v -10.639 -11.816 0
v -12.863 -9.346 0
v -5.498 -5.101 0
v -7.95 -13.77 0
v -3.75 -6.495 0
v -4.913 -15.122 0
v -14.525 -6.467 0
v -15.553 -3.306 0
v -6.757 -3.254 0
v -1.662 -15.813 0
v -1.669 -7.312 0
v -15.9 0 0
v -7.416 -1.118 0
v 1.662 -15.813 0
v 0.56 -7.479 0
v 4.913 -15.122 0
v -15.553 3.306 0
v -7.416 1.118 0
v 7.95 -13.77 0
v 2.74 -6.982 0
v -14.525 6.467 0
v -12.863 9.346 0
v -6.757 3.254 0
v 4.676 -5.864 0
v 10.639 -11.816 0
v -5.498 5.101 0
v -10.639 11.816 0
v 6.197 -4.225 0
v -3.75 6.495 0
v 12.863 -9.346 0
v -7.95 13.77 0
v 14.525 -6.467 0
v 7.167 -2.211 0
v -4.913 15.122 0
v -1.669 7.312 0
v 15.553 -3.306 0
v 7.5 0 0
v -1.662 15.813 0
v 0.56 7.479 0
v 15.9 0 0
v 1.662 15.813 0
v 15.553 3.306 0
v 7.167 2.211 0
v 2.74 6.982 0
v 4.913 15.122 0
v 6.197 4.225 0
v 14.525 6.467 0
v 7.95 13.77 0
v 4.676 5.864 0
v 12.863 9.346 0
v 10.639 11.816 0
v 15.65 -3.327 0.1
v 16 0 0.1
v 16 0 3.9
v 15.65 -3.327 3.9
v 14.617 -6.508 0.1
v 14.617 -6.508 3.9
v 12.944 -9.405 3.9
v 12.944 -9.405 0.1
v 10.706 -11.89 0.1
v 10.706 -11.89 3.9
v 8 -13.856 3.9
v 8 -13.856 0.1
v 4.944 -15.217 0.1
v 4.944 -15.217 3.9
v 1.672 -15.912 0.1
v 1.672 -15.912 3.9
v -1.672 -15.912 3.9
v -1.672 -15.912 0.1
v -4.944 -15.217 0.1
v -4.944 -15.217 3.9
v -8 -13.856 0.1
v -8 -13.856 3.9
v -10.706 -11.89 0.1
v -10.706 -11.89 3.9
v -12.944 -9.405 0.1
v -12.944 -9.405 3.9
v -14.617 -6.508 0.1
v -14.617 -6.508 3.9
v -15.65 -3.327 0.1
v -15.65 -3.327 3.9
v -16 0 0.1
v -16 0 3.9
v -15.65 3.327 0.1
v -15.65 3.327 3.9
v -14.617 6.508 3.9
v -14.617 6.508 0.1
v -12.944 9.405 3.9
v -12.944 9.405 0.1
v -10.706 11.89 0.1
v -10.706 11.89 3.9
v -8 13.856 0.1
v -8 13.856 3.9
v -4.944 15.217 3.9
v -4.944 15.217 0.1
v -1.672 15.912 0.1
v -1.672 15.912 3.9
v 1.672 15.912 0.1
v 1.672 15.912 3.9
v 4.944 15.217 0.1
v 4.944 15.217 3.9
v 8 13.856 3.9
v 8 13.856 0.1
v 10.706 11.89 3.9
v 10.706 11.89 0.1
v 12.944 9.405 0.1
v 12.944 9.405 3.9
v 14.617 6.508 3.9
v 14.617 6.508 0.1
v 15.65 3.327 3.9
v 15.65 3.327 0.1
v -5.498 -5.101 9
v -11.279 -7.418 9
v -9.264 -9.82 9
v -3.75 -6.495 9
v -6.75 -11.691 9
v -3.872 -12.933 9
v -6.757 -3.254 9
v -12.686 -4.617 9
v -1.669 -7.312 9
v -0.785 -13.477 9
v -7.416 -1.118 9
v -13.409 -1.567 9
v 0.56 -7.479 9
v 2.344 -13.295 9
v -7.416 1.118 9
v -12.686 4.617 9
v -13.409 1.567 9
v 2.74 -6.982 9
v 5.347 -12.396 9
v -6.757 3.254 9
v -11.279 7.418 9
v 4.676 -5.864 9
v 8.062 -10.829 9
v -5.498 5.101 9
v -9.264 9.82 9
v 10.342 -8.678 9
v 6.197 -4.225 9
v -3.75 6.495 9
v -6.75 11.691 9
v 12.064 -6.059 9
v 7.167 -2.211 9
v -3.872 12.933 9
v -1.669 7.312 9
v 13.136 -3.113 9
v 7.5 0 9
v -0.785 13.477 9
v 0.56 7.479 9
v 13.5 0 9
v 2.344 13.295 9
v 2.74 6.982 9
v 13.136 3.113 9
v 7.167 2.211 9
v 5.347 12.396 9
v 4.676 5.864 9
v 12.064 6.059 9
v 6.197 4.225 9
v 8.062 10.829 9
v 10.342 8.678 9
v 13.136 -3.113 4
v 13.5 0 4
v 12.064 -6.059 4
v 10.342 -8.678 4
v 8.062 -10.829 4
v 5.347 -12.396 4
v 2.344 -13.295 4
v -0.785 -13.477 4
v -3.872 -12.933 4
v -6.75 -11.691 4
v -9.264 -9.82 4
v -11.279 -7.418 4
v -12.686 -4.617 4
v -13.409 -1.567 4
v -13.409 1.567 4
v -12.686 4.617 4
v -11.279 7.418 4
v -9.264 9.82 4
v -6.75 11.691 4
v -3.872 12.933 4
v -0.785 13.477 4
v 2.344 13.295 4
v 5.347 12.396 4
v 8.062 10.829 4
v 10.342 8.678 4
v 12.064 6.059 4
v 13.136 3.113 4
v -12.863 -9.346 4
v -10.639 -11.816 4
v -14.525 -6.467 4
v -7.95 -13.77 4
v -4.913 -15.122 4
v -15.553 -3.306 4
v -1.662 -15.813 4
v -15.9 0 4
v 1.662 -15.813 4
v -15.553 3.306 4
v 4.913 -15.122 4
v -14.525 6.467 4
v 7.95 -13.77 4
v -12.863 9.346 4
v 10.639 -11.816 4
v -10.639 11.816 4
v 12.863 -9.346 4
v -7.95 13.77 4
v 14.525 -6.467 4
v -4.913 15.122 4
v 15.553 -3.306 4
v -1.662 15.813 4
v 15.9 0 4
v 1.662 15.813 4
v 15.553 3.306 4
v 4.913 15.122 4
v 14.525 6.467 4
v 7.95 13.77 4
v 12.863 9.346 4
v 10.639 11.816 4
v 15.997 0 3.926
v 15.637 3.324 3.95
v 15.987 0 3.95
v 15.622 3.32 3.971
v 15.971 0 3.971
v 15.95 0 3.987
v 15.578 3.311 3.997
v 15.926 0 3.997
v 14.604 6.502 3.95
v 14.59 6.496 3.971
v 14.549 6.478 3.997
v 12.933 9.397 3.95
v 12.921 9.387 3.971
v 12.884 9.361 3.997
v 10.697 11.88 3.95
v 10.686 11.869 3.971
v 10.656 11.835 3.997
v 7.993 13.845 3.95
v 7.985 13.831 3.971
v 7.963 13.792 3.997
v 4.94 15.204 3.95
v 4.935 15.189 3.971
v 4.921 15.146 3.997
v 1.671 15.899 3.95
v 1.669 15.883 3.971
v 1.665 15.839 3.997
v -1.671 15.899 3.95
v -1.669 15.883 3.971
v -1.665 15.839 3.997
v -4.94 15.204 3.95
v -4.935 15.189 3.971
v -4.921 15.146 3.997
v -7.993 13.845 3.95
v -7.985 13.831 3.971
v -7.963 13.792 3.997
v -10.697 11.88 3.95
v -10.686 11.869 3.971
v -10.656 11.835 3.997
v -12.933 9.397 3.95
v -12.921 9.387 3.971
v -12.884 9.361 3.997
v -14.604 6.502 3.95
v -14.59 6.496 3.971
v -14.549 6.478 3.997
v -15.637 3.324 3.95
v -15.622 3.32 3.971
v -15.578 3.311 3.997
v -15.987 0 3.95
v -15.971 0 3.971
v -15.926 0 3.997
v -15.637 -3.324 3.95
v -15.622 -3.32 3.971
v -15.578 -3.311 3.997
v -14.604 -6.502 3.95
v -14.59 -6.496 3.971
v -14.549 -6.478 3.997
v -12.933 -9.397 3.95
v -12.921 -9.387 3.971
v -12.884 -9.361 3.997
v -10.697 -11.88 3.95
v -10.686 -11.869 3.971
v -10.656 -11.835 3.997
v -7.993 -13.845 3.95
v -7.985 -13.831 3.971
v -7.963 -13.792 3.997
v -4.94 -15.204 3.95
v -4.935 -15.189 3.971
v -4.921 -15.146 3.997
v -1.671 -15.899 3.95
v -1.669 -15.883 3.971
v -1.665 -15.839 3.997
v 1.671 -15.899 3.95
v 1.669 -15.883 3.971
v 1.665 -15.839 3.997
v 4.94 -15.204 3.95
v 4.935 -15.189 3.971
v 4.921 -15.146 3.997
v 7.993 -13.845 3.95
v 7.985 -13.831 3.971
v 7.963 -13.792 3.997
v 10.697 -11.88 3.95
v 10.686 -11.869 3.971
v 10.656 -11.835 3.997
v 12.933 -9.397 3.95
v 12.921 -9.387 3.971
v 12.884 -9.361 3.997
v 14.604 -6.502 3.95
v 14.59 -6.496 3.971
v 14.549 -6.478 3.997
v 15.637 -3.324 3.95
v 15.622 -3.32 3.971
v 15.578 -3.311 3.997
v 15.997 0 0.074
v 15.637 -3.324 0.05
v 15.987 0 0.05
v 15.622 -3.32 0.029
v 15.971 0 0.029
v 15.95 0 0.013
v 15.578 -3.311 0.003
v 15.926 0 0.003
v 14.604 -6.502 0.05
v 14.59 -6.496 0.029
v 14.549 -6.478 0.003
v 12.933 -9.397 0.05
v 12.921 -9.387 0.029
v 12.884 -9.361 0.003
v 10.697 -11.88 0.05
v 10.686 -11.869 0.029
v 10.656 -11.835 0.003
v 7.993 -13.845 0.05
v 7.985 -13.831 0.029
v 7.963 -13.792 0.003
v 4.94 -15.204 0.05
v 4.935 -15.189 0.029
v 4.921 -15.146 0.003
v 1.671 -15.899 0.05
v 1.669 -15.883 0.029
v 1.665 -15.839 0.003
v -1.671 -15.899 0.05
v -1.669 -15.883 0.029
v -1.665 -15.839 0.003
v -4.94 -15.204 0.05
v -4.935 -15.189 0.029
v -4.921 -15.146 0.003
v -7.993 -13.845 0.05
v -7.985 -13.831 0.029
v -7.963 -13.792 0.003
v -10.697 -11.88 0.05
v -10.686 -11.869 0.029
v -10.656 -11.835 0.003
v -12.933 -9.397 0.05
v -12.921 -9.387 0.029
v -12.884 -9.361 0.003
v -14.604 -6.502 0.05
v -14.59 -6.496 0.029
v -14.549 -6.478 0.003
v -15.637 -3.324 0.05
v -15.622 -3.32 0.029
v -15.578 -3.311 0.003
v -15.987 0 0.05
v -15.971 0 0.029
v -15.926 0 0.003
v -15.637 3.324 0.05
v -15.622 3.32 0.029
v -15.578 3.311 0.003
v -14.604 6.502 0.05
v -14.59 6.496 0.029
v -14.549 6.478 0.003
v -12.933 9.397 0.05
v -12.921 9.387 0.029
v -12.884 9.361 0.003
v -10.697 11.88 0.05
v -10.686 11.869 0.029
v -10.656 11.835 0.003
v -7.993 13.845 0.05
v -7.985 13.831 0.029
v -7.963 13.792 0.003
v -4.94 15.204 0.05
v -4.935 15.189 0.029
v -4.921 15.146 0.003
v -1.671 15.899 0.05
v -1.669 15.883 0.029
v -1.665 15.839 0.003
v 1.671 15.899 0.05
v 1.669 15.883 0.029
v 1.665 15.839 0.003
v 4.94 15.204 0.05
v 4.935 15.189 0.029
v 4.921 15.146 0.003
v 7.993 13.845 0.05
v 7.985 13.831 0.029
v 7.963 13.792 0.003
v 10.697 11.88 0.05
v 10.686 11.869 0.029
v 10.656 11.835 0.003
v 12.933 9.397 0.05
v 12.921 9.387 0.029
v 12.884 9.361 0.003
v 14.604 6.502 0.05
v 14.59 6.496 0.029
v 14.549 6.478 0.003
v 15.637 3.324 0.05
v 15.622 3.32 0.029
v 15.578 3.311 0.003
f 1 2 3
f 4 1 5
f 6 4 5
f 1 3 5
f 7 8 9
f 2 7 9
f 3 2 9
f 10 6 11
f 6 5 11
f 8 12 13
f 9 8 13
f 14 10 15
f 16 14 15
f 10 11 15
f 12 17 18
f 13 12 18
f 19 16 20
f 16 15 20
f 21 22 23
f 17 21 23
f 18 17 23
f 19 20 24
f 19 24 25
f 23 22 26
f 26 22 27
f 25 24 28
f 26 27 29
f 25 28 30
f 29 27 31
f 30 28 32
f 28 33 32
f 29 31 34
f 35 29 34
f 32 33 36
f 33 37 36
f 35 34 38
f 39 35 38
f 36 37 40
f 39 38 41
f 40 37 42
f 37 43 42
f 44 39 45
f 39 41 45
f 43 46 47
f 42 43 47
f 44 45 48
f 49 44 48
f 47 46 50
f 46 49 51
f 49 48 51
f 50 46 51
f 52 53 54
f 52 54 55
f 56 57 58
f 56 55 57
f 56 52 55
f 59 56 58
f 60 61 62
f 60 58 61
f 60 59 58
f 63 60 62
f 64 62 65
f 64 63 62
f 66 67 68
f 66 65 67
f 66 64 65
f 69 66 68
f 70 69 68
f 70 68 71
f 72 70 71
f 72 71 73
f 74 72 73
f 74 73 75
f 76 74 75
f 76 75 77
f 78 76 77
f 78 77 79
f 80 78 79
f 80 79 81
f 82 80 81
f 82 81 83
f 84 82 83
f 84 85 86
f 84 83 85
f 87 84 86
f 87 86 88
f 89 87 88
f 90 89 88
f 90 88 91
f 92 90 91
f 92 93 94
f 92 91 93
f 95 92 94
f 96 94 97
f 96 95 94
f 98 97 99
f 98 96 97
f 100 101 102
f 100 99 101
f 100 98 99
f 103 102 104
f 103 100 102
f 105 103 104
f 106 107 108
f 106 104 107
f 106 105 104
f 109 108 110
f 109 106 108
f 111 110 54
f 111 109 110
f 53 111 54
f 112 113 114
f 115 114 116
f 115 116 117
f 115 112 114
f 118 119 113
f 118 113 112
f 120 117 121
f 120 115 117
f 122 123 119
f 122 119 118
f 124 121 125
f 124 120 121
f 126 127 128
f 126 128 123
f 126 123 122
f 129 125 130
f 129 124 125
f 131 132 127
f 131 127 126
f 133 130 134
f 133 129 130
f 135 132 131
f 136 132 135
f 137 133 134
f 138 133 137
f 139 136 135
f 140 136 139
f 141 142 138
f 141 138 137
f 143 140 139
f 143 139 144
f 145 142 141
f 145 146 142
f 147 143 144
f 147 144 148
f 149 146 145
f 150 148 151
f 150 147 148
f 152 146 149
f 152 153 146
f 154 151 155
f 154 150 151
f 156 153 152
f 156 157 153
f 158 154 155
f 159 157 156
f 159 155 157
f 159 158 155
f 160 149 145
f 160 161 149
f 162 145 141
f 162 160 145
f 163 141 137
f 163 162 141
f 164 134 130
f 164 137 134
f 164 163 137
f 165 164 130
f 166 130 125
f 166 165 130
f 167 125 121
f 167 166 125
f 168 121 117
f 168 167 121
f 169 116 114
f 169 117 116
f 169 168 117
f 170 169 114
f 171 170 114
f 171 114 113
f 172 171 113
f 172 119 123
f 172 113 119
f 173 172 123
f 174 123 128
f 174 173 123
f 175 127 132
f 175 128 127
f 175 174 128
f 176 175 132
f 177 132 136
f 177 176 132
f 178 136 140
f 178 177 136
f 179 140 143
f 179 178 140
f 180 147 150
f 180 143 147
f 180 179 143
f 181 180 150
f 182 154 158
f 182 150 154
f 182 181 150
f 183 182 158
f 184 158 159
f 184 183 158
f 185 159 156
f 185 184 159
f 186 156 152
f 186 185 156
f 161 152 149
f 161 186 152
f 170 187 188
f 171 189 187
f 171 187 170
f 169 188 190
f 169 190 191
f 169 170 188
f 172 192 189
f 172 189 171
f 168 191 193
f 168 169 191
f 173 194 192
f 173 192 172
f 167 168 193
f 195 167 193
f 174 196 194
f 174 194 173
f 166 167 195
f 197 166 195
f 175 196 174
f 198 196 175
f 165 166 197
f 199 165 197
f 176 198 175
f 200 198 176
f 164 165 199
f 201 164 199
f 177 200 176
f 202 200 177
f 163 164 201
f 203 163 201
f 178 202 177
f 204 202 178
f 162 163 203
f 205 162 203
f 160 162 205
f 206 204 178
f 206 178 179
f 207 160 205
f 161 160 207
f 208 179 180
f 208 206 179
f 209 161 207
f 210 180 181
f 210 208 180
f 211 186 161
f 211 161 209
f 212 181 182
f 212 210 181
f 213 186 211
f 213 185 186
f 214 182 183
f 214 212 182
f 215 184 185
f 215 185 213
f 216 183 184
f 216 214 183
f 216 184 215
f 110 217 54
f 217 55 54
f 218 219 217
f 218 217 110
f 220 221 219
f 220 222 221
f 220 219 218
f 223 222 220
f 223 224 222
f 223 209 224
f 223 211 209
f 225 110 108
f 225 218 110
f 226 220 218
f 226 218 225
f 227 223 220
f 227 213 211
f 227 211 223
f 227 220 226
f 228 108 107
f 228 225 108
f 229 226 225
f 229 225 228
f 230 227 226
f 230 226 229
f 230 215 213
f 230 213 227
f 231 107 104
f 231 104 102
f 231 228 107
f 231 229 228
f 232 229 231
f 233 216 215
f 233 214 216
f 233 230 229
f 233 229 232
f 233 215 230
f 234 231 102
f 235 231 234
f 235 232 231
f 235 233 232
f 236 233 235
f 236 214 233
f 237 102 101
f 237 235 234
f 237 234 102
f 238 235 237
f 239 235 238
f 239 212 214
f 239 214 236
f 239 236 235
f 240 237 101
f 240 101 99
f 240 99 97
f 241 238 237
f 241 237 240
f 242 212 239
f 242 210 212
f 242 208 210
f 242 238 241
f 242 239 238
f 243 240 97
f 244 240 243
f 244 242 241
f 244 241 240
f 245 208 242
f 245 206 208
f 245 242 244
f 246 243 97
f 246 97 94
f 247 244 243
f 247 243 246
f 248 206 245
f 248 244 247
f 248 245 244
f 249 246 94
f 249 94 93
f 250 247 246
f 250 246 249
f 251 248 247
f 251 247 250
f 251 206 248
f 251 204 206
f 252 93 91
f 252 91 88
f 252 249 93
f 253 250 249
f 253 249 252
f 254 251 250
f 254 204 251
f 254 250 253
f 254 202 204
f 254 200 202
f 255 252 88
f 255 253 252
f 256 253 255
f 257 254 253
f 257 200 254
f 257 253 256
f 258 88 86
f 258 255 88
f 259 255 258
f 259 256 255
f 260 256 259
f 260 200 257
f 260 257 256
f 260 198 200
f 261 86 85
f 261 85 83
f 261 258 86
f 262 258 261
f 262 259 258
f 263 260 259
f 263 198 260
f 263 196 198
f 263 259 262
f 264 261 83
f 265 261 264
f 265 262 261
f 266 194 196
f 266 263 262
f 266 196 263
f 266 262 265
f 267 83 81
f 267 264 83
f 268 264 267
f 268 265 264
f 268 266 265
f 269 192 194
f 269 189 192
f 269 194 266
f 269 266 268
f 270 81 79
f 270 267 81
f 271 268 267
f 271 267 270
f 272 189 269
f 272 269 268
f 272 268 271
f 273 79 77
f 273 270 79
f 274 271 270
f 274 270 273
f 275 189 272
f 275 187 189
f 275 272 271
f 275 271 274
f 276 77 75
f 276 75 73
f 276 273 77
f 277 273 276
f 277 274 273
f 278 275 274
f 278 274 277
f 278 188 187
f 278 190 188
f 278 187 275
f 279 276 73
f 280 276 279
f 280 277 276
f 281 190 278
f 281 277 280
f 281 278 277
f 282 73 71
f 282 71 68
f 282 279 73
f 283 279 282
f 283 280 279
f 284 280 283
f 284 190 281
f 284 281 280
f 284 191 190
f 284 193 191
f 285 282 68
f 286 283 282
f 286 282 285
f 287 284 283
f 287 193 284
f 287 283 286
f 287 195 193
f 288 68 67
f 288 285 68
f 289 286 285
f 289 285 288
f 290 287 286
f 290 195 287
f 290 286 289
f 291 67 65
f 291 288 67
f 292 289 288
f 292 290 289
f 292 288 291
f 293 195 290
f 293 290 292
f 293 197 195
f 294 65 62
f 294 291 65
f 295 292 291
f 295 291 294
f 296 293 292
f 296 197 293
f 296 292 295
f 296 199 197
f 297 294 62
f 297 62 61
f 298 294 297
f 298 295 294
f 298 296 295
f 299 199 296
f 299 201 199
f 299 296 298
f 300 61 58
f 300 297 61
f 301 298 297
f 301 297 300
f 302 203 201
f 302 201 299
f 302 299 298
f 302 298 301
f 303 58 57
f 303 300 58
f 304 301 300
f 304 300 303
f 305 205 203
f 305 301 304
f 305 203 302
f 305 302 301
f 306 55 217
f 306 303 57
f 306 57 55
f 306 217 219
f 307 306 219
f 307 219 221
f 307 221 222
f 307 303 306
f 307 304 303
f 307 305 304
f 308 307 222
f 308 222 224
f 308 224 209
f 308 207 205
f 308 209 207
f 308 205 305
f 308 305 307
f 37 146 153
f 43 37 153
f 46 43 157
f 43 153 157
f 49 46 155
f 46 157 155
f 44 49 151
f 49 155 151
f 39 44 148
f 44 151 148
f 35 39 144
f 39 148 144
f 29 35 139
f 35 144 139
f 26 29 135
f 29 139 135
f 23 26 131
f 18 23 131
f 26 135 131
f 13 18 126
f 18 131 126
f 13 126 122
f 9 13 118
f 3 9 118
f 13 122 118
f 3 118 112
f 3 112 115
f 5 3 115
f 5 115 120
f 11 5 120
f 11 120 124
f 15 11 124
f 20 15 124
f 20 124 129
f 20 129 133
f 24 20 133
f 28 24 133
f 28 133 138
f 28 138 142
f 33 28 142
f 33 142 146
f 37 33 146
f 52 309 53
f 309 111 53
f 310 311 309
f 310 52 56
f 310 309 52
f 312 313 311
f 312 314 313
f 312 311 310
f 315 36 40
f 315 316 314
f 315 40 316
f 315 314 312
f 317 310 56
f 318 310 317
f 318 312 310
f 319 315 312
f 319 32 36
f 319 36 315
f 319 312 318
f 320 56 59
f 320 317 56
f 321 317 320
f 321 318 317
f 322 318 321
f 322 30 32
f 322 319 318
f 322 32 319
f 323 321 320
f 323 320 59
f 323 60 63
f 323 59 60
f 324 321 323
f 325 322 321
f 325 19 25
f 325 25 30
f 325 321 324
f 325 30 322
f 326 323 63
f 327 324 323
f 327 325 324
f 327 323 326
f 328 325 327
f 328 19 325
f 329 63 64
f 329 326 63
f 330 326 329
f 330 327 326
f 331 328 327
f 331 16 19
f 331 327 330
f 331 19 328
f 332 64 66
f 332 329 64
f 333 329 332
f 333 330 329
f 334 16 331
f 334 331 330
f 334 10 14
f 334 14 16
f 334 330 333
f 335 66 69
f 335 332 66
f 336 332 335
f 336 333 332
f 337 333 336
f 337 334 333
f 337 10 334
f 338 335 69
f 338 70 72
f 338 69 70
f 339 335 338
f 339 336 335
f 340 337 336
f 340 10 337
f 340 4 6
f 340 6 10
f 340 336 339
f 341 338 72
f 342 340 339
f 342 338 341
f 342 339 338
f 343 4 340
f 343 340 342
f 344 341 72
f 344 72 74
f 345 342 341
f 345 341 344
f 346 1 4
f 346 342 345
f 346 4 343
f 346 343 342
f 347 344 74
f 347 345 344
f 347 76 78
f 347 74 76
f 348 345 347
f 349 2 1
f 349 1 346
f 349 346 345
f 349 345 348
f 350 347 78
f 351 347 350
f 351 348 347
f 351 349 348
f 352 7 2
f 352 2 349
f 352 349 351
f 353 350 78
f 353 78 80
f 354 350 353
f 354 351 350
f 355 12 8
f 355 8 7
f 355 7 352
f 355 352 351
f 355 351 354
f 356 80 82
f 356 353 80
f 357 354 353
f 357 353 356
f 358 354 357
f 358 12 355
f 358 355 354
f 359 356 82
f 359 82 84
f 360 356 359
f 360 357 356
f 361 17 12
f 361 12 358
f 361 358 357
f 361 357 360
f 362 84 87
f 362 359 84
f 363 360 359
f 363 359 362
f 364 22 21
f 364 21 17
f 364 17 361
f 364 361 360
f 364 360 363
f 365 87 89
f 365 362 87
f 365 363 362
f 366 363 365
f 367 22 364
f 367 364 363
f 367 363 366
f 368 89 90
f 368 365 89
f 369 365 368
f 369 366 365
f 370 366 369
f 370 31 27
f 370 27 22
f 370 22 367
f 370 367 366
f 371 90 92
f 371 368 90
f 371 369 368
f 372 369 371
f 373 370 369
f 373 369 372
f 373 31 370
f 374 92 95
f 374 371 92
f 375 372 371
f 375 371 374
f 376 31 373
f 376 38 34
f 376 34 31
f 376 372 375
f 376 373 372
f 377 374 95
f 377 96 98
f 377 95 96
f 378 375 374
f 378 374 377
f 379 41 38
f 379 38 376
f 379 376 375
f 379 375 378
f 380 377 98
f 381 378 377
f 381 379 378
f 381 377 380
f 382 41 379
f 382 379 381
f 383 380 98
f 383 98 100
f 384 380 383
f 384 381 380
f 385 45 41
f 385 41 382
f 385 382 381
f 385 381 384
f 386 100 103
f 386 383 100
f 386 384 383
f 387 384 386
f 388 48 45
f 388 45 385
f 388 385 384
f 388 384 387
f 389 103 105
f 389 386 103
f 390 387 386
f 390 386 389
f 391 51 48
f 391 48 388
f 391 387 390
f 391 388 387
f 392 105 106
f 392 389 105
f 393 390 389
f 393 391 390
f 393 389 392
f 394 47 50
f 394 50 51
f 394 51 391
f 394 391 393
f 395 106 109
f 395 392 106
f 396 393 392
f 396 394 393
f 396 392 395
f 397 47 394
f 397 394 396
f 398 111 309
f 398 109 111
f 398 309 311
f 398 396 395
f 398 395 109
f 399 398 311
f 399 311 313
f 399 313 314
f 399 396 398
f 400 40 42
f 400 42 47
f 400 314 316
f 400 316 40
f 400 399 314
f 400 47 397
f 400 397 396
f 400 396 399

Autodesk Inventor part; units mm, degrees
ref_plane "YZ Plane" through (0, 0, 0) normal (1, 0, 0) x (0, 1, 0)
ref_plane "XZ Plane" through (0, 0, 0) normal (0, 1, 0) x (-1, 0, 0)
ref_plane "XY Plane" through (0, 0, 0) normal (0, 0, 1) x (1, 0, 0)
sketch "スケッチ1" plane through (0, 0, 0) normal (0, 0, 1) x (1, 0, 0)
  circle A0 centre (0, 0) radius 16
  dimension "d0" = 32
extrude "押し出し1" add sketch "スケッチ1" along normal blind 4
sketch "スケッチ2" plane through (0, 0, 4) normal (0, 0, 1) x (1, 0, 0)
  circle A0 centre (0, 0) radius 13.5
  dimension "d3" = 27
extrude "押し出し2" add sketch "スケッチ2" along normal blind 5
sketch "スケッチ3" plane through (0, 0, 9) normal (0, 0, 1) x (1, 0, 0)
  circle A0 centre (0, 0) radius 7.5
  dimension "d6" = 15
extrude "押し出し3" cut sketch "スケッチ3" against normal through all
fillet "フィレット1" radius 0.1 2 edges at (-16, 0, 4) (-16, 0, 0)
properties part number "555_GearBox_Flange" material "鉄、鋳鉄"
